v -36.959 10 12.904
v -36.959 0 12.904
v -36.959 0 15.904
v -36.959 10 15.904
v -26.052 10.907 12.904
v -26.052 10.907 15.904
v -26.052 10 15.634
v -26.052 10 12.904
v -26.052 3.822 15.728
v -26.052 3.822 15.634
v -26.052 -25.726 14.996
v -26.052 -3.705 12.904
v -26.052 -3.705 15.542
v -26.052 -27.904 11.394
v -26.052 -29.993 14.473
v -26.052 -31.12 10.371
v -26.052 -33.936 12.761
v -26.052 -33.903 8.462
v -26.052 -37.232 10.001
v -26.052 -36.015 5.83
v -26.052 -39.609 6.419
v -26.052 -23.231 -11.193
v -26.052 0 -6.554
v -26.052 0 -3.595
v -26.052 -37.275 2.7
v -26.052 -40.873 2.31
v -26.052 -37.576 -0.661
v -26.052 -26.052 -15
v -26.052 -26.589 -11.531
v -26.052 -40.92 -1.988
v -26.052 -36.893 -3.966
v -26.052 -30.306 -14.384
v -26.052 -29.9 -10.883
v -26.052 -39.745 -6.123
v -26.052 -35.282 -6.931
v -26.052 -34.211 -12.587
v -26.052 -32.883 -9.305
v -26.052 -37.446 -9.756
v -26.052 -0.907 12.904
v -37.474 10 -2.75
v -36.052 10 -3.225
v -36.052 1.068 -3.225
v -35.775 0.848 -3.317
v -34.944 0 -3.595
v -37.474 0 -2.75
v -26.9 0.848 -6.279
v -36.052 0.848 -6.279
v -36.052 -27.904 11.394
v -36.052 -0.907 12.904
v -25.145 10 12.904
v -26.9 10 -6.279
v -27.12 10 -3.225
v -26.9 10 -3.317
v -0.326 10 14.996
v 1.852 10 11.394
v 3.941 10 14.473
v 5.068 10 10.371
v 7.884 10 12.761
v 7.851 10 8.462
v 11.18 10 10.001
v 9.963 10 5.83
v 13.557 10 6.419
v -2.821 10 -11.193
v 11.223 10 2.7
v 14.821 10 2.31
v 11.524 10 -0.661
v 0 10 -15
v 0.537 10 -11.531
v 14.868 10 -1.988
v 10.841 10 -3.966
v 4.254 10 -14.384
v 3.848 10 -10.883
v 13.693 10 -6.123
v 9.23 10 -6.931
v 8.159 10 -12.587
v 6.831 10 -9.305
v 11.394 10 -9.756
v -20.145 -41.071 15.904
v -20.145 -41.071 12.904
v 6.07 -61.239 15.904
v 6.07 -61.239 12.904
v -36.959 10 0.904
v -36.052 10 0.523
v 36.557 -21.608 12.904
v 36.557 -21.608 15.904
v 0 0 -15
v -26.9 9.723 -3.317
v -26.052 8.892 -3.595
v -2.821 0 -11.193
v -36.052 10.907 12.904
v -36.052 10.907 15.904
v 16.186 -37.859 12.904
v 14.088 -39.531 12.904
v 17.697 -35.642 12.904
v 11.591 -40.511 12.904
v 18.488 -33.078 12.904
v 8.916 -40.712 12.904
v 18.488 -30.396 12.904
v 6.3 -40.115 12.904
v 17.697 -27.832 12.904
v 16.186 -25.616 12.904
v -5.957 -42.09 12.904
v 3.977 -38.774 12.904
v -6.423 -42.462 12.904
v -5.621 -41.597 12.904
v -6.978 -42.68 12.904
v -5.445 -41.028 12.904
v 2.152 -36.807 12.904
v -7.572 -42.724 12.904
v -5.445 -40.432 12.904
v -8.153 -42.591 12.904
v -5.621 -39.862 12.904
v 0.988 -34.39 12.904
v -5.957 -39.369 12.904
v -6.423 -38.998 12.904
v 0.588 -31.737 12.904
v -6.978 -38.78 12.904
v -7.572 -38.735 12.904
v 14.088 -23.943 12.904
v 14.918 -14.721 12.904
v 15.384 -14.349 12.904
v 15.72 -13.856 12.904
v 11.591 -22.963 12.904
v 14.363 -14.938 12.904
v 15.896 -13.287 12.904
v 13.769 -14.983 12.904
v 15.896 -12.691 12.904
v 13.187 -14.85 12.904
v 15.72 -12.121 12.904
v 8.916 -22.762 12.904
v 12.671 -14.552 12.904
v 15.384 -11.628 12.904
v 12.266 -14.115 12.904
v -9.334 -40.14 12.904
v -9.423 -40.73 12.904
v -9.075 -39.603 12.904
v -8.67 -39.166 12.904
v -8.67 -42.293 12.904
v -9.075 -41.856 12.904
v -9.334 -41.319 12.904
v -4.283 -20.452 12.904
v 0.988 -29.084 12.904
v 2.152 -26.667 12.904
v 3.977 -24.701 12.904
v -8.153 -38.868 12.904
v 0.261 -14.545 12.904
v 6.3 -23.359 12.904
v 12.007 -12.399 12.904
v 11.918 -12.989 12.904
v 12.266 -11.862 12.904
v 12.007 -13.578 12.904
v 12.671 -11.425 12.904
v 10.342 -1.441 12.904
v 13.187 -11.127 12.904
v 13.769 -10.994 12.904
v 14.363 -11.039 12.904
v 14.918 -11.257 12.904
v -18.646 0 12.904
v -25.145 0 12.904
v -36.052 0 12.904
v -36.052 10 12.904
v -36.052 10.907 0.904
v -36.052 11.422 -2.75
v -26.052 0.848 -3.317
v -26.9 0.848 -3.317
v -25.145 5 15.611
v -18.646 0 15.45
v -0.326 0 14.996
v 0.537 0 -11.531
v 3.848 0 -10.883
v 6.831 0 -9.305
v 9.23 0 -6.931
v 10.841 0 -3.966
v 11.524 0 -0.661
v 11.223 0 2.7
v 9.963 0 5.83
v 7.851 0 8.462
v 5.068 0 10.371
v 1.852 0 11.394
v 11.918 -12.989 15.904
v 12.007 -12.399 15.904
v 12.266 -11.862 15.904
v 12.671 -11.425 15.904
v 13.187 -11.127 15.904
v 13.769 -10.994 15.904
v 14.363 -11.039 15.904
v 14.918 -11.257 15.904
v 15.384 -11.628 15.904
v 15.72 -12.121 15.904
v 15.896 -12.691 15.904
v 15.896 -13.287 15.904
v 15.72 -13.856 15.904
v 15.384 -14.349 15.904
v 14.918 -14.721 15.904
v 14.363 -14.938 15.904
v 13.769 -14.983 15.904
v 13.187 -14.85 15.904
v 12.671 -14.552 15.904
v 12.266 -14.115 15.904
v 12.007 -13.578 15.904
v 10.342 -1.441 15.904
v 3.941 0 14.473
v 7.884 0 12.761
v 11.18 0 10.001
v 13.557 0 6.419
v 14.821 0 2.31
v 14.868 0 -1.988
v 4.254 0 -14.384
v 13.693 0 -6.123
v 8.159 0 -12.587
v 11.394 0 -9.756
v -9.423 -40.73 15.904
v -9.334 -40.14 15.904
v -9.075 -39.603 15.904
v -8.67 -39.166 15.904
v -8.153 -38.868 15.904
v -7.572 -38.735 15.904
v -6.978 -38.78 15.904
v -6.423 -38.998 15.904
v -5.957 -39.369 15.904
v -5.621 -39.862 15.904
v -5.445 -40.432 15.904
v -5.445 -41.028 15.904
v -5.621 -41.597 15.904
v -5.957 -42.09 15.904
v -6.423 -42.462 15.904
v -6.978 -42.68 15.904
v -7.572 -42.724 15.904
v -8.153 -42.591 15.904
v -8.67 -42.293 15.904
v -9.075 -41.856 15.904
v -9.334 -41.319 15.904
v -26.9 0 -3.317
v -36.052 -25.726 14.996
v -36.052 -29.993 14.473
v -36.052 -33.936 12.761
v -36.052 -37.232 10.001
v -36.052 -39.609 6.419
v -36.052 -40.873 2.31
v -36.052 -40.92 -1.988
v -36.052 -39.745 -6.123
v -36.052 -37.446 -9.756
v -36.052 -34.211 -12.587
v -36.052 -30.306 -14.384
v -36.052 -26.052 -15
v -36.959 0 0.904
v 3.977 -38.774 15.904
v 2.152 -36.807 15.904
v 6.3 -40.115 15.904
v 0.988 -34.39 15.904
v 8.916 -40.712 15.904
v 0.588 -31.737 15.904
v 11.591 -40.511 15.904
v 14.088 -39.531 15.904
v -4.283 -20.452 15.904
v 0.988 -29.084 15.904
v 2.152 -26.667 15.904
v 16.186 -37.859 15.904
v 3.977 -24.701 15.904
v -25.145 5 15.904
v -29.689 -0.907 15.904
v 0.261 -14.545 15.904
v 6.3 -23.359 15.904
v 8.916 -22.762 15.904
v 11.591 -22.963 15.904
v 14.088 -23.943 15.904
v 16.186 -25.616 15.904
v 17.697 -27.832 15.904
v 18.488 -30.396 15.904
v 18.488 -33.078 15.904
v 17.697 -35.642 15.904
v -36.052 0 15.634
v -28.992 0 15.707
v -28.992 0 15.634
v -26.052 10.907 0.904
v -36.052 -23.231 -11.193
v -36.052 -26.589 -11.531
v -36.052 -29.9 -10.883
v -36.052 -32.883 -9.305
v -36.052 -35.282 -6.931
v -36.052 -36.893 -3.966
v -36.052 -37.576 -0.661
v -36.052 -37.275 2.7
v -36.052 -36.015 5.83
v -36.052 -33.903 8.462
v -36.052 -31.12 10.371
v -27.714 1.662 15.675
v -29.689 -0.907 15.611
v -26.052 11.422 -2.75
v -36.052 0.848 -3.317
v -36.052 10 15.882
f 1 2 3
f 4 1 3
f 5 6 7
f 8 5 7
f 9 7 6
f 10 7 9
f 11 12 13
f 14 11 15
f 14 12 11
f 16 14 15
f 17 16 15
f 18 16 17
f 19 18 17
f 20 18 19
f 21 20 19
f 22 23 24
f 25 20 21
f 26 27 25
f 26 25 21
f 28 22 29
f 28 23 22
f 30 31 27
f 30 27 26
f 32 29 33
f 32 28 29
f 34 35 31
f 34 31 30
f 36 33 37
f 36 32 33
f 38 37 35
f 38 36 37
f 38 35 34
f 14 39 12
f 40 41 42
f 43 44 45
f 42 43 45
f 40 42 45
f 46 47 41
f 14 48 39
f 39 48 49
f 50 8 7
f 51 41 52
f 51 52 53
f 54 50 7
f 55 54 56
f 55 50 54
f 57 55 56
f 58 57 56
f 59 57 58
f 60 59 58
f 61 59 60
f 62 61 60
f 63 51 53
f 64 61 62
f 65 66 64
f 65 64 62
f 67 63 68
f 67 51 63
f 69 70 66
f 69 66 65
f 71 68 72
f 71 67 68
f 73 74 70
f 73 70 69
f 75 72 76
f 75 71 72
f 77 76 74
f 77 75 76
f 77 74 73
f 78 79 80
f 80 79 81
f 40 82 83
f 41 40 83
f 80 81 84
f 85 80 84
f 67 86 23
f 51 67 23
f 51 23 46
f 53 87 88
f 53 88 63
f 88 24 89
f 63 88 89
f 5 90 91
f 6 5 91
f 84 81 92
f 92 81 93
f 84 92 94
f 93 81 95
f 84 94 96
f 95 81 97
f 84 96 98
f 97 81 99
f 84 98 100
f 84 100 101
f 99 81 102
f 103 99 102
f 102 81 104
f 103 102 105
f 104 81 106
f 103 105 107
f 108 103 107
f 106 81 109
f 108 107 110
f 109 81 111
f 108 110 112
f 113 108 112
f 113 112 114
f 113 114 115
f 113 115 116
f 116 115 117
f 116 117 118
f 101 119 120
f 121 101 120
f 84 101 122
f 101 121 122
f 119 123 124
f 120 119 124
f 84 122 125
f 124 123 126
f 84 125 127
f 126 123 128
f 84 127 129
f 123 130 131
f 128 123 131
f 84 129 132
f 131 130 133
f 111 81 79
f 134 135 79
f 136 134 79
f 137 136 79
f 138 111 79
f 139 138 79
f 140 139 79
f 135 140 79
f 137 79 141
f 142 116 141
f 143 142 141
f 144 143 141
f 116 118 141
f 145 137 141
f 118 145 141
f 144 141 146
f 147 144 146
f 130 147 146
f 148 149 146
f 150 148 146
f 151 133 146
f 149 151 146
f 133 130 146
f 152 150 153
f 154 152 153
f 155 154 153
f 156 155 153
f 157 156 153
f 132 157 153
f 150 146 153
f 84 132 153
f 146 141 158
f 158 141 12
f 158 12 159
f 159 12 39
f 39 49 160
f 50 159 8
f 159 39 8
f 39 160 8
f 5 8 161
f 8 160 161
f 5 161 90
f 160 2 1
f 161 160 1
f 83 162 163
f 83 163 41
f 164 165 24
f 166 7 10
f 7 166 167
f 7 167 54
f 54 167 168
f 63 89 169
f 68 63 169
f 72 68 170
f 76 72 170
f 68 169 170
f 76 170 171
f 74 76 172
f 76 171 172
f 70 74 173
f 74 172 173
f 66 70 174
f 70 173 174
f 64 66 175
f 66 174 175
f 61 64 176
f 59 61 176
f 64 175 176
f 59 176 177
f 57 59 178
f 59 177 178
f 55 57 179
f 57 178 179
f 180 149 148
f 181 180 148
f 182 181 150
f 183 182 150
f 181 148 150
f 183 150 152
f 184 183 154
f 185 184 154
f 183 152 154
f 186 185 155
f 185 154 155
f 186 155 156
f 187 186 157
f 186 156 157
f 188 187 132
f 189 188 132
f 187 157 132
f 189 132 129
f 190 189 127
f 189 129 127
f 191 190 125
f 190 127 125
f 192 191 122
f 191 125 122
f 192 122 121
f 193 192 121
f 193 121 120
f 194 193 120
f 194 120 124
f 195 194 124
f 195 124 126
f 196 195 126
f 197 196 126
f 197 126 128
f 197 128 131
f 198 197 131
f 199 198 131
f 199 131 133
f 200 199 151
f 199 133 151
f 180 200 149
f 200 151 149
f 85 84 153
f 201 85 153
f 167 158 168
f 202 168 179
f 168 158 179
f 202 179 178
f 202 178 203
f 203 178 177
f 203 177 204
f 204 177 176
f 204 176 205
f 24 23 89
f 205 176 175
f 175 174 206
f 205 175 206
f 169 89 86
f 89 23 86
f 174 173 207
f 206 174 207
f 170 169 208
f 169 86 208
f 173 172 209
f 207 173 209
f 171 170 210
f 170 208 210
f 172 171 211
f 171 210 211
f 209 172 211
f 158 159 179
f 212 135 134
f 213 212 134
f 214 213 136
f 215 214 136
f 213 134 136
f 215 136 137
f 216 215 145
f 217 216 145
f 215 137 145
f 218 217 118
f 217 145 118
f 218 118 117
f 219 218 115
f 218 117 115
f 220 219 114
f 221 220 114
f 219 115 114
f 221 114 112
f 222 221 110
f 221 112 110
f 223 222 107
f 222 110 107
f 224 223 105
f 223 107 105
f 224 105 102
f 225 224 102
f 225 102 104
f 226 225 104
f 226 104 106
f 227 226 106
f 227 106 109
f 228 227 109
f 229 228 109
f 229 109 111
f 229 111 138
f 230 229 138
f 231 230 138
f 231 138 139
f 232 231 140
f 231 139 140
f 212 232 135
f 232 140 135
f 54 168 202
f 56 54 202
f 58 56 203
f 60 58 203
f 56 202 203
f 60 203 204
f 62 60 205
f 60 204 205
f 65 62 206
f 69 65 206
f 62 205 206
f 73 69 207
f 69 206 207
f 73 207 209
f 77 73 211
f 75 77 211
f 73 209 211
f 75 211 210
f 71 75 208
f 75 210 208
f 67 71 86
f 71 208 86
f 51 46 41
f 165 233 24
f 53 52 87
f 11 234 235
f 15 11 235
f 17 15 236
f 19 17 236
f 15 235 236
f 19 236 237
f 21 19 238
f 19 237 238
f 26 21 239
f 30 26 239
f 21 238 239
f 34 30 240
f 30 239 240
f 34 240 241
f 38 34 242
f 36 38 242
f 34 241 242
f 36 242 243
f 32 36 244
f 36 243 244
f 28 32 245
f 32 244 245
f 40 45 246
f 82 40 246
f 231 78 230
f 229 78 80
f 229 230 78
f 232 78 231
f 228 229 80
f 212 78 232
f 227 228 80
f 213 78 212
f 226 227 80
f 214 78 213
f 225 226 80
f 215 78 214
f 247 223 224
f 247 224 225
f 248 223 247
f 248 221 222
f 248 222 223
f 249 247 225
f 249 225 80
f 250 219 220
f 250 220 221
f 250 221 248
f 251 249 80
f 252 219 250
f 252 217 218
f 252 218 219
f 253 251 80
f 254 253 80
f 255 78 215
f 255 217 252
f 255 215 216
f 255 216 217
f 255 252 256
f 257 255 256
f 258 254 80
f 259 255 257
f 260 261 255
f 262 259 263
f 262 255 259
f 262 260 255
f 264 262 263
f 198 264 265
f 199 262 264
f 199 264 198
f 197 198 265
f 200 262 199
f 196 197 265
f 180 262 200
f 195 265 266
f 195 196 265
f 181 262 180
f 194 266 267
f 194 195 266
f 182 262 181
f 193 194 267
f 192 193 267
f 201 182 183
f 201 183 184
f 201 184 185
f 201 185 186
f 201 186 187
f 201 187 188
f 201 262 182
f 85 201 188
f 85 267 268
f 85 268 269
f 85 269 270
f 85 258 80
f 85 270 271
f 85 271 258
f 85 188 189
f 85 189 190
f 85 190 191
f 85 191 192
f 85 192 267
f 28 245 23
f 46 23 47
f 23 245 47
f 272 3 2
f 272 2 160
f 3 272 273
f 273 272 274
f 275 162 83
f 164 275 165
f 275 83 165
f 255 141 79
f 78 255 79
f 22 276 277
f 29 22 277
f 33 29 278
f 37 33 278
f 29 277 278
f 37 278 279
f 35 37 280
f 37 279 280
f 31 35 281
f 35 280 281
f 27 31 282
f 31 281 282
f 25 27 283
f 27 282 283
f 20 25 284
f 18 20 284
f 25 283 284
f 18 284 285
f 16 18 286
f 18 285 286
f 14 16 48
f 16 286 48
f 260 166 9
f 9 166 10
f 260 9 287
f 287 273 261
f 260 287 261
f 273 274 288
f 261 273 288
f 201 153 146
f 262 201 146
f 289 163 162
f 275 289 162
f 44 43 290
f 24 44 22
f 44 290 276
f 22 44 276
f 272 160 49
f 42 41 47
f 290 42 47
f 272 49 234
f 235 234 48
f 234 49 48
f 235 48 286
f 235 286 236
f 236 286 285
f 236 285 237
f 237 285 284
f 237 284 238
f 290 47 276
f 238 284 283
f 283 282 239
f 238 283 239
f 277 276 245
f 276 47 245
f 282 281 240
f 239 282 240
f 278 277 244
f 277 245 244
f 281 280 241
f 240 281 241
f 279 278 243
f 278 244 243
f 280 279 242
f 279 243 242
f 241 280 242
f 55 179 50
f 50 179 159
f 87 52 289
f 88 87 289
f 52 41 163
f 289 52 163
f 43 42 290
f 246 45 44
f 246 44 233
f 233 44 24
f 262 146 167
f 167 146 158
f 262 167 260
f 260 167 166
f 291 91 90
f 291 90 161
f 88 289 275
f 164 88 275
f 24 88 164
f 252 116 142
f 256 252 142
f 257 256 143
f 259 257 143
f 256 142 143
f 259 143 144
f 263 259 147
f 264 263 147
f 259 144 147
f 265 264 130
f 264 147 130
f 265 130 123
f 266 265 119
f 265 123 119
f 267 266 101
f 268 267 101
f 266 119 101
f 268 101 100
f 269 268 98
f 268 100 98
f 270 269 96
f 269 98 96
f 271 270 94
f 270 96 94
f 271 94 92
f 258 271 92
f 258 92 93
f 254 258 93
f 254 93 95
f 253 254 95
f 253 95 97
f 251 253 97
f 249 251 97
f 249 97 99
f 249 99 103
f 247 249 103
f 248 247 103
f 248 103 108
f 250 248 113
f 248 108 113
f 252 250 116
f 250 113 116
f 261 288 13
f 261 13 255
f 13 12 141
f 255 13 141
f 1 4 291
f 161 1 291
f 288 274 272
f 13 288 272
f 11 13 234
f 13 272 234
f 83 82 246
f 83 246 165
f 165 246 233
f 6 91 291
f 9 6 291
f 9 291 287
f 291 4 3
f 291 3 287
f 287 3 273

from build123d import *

# Parameters (mm, degrees)
BOSS_EXTRUDE1_DEPTH = 10
CIRPATTERN1_COUNT   = 2
CIRPATTERN1_ANGLE   = 90
SKETCH4_R           = 2
SKETCH4_R_2         = 9
BOSS_EXTRUDE2_DEPTH = 3


with BuildPart() as part:
    # Sketch1 → Boss-Extrude1 (new body)
    with BuildSketch(Plane(origin=(0, 0, 0), x_dir=(1, 0, 0), z_dir=(0, 1, 0))):
        with BuildLine():
            Line((0, 15), (-26.900155428, 6.278700475))
            Line((-26.900155428, 6.278700475), (-37.47437809, 2.750369919))
            Line((-37.47437809, 2.750369919), (-36.958650594, -0.903972442))
            Line((-36.958650594, -0.903972442), (-26.900155428, 3.317423045))
            Line((-26.900155428, 3.317423045), (-2.821131559, 11.193160892))
            ThreePointArc((-2.821131559, 11.193160892), (11.303828334, 2.338610491), (1.8517881, -11.393705054))
            Line((1.8517881, -11.393705054), (-25.145499842, -12.903972442))
            Line((-25.145499842, -12.903972442), (-32.586903668, -12.903972442))
            Line((-32.586903668, -12.903972442), (-36.958650594, -12.903972442))
            Line((-36.958650594, -12.903972442), (-36.958650594, -15.903972442))
            Line((-36.958650594, -15.903972442), (-0.325723138, -14.996463064))
            ThreePointArc((-0.325723138, -14.996463064), (14.99911574, -0.16287117), (0, 15))
        make_face()
    boss_extrude1 = extrude(amount=BOSS_EXTRUDE1_DEPTH)

    # CirPattern1: Boss-Extrude1 ×2 about axis
    cirpattern1_axis = Axis((-31.052075218, 5, 0), (0, 0, -1))
    for i in range(1, CIRPATTERN1_COUNT):
        add(boss_extrude1.rotate(cirpattern1_axis, i * CIRPATTERN1_ANGLE / (CIRPATTERN1_COUNT - 1)))

    # Sketch4 → Boss-Extrude2 (add)
    with BuildSketch(Plane(origin=(0, 0, 12.903972442), x_dir=(-1, 0, 0), z_dir=(0, 0, -1))):
        Polygon((25.145499842, 5), (29.689369088, -0.906575376), (4.282629912, -20.451725217), (20.145121552, -41.071377206), (-6.070129591, -61.238507201), (-36.557141793, -21.608441758), (-10.34189065, -1.441311764), (-0.261239334, -14.545149841), align=None)
        with Locations((-13.91810605, -12.988615209)):
            Circle(SKETCH4_R, mode=Mode.SUBTRACT)
        with Locations((7.422802492, -40.729661018)):
            Circle(SKETCH4_R, mode=Mode.SUBTRACT)
        with Locations((-9.58846225, -31.737060066)):
            Circle(SKETCH4_R_2, mode=Mode.SUBTRACT)
    extrude(amount=-BOSS_EXTRUDE2_DEPTH)


solid = part.part
